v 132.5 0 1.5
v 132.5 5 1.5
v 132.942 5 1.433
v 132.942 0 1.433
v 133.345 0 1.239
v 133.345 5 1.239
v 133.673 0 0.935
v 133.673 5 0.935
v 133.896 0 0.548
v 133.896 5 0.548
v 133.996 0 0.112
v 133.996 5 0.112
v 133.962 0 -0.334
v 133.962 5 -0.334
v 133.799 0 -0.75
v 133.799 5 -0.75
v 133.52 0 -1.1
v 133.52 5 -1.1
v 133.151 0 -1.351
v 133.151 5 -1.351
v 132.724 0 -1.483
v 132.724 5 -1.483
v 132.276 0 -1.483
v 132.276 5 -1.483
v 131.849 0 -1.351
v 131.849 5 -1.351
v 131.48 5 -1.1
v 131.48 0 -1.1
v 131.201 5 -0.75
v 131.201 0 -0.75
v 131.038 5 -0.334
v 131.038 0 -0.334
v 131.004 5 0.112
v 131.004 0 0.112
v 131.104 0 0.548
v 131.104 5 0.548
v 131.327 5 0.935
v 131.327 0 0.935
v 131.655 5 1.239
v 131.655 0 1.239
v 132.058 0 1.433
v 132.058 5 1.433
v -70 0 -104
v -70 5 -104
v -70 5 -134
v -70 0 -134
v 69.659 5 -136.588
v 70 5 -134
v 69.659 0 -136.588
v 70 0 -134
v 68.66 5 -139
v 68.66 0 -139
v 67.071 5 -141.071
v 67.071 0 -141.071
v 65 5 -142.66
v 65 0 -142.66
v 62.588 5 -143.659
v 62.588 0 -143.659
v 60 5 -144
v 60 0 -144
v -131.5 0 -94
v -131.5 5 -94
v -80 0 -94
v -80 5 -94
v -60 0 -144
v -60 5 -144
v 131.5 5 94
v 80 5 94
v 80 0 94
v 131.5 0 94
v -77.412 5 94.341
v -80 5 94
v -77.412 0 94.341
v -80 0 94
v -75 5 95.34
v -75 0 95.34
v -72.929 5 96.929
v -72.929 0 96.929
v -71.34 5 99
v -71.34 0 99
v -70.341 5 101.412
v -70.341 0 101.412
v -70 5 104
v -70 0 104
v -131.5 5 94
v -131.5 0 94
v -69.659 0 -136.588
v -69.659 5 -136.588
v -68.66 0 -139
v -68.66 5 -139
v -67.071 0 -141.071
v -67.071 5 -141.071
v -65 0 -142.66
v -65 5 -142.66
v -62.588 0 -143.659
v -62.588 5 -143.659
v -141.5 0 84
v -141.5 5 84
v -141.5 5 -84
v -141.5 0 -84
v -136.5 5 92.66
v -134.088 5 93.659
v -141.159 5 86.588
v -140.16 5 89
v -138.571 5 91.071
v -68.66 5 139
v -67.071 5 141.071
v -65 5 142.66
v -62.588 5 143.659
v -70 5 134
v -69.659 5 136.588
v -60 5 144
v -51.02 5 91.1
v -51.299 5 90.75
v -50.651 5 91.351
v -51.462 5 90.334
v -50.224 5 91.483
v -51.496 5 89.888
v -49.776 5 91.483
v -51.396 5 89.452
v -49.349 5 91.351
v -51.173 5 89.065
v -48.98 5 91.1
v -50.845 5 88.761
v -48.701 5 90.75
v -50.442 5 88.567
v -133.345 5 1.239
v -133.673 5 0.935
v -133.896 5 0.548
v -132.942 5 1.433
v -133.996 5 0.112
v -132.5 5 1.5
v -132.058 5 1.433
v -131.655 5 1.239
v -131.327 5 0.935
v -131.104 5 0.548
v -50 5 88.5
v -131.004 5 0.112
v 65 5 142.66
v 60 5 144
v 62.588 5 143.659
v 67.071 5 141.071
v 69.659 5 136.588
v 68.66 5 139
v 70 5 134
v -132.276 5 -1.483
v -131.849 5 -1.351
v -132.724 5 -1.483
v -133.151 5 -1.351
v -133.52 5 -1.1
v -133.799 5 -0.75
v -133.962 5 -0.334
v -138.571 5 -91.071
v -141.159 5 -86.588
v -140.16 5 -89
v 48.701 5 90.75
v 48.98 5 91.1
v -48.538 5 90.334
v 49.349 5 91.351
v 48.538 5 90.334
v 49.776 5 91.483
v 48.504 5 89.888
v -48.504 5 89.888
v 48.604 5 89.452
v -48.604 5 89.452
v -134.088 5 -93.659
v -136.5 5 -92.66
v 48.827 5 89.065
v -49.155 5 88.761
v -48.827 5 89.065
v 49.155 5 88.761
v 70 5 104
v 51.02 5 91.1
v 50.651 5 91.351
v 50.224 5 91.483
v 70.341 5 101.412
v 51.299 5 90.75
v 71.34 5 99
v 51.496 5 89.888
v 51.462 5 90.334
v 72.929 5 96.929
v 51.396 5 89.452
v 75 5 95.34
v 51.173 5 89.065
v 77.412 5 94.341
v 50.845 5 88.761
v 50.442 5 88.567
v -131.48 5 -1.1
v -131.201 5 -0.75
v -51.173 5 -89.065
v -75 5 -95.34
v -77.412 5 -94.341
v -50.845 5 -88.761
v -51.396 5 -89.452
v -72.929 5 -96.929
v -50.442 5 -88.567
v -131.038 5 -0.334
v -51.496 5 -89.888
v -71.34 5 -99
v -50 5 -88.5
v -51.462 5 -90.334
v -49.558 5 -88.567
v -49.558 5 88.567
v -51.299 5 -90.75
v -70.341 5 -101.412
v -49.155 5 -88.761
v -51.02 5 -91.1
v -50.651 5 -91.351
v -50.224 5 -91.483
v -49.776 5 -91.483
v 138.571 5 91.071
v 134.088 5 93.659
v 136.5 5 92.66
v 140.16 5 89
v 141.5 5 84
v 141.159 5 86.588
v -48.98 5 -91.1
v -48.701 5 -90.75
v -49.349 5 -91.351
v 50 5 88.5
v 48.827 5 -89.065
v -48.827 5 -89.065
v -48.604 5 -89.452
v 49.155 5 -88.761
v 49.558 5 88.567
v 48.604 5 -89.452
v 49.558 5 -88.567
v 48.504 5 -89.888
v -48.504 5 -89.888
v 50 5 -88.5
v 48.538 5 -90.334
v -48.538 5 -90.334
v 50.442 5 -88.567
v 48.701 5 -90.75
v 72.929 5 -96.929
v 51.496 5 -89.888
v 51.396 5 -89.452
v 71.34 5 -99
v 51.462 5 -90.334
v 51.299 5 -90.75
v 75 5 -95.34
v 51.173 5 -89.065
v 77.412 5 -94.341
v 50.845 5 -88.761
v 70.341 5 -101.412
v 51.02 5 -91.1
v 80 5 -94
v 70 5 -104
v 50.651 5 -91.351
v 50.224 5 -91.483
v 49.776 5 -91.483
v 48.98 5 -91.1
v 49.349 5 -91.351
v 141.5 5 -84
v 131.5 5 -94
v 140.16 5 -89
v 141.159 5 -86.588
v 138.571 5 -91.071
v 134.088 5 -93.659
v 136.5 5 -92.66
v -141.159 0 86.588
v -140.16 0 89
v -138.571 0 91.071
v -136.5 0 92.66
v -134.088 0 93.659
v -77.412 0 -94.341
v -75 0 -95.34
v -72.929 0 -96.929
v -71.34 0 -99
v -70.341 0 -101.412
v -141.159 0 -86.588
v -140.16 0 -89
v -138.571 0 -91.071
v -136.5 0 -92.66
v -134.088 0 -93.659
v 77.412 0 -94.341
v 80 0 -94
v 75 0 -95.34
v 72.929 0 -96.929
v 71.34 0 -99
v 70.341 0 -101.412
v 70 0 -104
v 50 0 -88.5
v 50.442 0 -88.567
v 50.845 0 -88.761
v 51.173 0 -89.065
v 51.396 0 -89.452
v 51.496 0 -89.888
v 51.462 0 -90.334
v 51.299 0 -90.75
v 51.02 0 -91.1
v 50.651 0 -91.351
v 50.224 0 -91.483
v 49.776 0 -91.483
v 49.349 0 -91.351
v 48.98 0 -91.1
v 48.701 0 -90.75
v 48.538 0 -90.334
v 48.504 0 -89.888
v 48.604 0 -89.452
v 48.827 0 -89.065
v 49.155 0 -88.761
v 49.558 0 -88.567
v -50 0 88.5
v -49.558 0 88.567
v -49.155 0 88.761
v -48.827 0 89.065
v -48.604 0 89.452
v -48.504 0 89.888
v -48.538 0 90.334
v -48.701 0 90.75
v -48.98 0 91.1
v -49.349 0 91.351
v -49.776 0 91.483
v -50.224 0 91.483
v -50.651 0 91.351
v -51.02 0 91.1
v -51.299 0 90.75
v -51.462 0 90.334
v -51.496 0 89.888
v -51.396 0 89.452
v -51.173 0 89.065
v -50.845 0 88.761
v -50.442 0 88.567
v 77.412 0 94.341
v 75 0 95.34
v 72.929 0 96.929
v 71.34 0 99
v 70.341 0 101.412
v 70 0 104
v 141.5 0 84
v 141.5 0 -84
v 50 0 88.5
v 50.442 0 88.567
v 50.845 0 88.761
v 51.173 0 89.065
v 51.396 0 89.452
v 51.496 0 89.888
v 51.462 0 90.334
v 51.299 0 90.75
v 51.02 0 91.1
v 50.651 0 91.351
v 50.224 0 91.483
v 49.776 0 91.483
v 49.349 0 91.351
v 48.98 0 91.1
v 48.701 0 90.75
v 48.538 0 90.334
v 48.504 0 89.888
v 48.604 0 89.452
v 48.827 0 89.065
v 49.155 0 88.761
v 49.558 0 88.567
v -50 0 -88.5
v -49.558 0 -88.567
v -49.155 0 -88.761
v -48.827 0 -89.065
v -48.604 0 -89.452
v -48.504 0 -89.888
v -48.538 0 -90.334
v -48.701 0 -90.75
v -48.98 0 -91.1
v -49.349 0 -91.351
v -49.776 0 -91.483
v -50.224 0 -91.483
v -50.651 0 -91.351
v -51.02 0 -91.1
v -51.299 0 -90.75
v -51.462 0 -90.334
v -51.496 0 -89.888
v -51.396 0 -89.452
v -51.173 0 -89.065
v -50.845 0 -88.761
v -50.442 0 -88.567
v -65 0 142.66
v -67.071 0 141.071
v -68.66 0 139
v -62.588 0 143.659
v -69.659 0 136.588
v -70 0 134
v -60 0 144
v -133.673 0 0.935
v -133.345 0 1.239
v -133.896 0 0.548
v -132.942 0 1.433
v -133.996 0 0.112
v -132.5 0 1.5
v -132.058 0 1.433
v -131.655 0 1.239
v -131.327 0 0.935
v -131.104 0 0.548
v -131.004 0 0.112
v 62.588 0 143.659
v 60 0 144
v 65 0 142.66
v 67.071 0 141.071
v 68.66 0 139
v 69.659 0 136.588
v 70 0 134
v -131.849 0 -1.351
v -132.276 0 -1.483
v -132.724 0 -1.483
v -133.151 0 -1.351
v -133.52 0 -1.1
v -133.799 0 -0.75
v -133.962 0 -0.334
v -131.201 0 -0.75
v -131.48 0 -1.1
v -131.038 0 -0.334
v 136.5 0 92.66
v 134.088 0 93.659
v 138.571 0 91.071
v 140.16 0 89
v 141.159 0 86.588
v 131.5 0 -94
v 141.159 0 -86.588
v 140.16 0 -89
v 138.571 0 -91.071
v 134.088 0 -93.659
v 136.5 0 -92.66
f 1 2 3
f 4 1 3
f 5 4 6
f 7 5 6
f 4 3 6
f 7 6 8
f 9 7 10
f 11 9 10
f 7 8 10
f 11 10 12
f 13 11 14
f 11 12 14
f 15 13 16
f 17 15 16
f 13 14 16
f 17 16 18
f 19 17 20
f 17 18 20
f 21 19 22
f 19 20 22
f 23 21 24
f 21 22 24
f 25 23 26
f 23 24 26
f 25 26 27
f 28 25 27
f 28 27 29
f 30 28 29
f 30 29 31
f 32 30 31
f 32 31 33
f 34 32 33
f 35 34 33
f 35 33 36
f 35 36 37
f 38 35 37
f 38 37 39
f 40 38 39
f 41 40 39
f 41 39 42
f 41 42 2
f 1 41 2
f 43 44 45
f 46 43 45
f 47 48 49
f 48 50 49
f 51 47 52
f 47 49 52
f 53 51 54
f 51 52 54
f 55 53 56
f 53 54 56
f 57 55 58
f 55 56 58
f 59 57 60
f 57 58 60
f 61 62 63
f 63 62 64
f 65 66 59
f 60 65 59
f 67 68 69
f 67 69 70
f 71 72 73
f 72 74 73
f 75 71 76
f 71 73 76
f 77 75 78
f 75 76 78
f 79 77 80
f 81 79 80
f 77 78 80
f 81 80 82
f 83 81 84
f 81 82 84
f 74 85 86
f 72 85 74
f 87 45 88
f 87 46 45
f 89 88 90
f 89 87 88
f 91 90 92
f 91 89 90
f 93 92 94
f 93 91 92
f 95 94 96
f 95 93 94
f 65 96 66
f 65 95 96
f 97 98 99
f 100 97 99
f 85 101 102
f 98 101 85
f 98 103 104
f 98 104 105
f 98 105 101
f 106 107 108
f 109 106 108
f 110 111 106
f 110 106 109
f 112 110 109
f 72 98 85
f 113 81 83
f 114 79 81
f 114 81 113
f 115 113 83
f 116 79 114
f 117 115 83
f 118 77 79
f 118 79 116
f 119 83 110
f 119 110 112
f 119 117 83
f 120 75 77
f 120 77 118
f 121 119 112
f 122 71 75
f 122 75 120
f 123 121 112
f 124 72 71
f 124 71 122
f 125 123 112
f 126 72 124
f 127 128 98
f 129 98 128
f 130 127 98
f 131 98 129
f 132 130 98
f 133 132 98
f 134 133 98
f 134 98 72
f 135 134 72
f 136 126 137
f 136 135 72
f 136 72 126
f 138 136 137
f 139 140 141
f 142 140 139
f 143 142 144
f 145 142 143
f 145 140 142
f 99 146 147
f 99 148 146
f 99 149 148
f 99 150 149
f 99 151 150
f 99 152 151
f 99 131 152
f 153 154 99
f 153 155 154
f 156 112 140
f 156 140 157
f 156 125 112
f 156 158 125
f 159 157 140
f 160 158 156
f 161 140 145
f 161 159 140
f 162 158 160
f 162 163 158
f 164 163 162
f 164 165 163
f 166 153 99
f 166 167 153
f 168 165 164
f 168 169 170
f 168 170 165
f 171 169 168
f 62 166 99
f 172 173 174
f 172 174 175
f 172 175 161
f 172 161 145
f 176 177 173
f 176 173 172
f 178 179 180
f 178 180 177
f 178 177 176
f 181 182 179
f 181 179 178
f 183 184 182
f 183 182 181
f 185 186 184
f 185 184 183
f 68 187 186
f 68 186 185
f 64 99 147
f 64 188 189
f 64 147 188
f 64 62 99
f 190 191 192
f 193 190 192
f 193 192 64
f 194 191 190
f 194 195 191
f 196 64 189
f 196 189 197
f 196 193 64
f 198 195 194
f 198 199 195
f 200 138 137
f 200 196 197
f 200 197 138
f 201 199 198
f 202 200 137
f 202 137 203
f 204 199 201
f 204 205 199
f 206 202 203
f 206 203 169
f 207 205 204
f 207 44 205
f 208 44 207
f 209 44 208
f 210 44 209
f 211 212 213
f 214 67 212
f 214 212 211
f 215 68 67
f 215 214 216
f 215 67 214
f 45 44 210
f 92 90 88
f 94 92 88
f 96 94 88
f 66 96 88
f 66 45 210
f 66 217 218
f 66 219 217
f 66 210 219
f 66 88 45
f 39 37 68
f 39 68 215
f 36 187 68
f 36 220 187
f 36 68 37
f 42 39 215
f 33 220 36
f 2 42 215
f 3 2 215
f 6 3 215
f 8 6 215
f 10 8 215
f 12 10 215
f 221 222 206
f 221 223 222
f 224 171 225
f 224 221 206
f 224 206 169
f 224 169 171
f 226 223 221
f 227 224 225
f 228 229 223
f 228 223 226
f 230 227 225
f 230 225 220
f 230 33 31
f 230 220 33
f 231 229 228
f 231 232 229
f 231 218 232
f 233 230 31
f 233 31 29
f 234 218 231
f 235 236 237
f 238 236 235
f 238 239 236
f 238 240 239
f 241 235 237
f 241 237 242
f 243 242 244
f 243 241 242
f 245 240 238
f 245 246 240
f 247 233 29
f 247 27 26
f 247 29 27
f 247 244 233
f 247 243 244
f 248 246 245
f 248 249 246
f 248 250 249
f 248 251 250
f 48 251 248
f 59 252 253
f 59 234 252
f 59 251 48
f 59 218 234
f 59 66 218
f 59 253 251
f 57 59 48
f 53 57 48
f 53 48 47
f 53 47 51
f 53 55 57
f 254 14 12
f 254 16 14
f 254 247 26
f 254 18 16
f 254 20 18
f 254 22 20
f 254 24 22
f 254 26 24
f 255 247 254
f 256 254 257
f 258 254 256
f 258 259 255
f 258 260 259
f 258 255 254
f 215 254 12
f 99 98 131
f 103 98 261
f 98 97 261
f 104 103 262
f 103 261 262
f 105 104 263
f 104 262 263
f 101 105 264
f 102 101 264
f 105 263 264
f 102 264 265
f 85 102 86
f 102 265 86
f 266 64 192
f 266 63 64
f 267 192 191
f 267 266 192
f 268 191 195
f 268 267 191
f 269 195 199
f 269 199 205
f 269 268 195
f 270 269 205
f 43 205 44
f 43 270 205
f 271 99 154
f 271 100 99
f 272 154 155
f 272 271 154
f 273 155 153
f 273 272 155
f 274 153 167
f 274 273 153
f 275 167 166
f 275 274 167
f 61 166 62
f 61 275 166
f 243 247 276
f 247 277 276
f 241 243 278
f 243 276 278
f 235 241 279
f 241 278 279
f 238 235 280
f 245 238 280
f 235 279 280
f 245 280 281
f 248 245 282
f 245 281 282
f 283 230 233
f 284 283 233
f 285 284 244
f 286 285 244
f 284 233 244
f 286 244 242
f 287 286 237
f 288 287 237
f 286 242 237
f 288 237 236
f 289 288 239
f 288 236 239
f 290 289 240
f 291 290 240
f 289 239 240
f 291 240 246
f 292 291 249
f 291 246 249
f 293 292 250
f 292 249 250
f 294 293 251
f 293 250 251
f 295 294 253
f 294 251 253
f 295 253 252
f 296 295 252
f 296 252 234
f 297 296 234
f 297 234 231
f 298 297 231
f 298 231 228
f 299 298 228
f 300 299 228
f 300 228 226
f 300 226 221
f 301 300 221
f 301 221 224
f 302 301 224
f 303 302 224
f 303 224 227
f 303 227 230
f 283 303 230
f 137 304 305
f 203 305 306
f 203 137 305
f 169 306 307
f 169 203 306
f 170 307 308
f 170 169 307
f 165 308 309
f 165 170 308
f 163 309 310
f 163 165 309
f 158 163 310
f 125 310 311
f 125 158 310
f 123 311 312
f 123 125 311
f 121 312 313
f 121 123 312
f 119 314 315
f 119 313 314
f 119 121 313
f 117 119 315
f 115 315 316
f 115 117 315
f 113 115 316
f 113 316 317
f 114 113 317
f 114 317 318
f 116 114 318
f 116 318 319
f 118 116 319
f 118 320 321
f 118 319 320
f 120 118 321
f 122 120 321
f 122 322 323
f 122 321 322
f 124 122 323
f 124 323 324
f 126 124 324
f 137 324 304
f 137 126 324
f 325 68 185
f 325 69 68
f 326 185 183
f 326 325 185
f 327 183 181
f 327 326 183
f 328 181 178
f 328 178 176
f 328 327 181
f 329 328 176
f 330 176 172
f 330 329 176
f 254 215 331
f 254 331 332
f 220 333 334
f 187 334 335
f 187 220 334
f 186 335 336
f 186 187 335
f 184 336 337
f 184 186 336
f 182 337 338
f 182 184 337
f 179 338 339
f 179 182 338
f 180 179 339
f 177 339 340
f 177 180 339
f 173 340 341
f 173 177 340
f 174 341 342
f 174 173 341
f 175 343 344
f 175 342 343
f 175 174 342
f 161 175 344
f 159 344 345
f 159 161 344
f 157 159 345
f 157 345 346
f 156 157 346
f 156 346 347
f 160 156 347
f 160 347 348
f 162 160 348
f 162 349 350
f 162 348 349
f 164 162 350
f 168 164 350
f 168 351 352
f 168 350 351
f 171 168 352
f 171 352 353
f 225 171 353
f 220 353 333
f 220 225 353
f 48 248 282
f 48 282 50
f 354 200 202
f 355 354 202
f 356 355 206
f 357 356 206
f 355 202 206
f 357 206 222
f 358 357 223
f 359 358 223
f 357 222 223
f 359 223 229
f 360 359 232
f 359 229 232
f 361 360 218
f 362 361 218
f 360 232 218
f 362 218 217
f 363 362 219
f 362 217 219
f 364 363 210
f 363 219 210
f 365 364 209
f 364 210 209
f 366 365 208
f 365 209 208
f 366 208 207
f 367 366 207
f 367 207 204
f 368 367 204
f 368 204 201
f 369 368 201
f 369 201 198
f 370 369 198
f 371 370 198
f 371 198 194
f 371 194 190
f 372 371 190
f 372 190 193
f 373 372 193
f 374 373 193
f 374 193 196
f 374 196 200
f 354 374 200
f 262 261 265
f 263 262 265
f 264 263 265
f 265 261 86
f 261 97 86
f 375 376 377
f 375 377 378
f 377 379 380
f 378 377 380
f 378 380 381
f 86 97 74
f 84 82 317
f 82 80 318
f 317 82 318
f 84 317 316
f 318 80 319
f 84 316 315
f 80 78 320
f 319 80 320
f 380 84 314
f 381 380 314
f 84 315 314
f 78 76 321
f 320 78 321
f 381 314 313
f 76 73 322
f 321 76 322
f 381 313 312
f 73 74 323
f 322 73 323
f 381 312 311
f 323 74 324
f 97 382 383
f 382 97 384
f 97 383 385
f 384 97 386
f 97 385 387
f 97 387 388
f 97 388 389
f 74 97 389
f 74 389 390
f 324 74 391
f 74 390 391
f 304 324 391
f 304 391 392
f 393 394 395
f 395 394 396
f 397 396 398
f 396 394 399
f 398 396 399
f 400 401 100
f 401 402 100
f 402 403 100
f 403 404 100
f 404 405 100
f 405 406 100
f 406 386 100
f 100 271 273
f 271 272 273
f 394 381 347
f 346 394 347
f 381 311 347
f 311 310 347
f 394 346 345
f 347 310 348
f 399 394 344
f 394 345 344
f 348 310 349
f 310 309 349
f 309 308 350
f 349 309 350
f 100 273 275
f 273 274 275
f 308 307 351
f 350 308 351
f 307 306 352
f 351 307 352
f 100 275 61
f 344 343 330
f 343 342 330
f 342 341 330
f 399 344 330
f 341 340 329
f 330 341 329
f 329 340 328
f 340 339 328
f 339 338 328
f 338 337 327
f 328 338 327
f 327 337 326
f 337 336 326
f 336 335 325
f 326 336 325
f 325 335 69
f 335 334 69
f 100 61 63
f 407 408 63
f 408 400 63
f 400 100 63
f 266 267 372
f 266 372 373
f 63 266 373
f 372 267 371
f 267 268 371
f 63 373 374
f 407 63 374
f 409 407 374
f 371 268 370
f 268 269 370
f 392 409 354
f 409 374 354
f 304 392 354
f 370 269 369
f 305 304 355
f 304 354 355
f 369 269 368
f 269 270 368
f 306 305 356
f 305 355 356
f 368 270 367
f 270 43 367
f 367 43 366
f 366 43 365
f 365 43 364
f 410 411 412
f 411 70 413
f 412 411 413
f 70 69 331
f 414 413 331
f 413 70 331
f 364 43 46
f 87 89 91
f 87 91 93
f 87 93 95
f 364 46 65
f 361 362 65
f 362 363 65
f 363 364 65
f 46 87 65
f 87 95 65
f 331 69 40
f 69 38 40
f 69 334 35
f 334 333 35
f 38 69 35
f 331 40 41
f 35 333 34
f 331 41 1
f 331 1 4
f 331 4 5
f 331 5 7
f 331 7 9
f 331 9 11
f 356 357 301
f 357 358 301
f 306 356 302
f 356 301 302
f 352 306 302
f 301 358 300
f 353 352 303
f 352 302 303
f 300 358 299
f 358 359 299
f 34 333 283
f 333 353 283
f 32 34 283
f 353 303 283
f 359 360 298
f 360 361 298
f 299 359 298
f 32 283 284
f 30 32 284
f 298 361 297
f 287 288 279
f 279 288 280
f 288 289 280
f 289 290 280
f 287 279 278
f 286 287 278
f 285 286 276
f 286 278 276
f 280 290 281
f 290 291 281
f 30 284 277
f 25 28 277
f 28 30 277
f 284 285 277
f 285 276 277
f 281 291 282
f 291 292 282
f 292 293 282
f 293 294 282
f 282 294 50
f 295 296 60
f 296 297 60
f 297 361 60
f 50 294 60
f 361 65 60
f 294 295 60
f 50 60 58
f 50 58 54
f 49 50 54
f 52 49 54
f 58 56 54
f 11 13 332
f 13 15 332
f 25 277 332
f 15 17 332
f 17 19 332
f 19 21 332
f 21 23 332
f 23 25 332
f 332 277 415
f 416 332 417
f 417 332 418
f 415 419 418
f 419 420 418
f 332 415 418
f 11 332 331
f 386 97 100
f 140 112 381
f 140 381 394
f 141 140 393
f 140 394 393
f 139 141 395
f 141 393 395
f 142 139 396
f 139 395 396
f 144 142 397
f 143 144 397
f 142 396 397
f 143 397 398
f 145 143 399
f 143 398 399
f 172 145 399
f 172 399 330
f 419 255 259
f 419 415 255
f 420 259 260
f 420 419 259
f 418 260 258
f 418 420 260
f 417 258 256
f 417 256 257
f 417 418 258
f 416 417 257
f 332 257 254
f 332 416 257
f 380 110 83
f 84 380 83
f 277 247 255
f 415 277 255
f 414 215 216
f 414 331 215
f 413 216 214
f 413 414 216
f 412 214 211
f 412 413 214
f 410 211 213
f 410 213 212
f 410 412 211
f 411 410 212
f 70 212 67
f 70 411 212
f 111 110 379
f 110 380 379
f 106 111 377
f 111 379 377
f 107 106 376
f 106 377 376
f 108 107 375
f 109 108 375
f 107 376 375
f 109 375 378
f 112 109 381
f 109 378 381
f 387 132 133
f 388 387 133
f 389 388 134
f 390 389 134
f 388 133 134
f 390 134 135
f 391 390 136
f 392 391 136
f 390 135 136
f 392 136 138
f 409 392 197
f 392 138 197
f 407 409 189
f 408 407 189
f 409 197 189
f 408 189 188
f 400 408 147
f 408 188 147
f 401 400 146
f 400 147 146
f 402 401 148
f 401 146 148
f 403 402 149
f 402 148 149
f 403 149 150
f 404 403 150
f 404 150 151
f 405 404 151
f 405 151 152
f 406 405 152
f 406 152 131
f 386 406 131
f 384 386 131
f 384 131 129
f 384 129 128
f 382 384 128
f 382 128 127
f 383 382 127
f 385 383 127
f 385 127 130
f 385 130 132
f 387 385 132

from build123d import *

# Parameters (mm, degrees)
SKETCH_1_W           = 300
SKETCH_1_H           = 300
EXTRUDE_1_DEPTH      = 5
CUT_EXTRUDE_3_DEPTH  = 10
CUT_EXTRUDE_5_DEPTH  = 10
SKETCH_7_OUTSIDE_W   = 373.028
SKETCH_7_OUTSIDE_H   = 263.028
SKETCH_7_OUTSIDE_W_2 = 283
SKETCH_7_OUTSIDE_H_2 = 188
CUT_EXTRUDE_6_DEPTH  = 10
FILLET_1_R           = 10
SKETCH_8_R           = 1.5
CUT_EXTRUDE_7_DEPTH  = 200
SKETCH_9_R           = 1.5
CUT_EXTRUDE_8_DEPTH  = 200
SKETCH_10_W          = 140
SKETCH_10_H          = 50
EXTRUDE_2_DEPTH      = 5
FILLET_2_R           = 10


with BuildPart() as part:
    # 草图1 → 凸台-拉伸1 (new body)
    with BuildSketch(Plane(origin=(0, 0, 0), x_dir=(1, 0, 0), z_dir=(0, 1, 0))):
        Rectangle(SKETCH_1_W, SKETCH_1_H)
    extrude(amount=EXTRUDE_1_DEPTH)

    # 草图4 → 切除-拉伸3 (cut)
    with BuildSketch(Plane(origin=(0, 5, 0), x_dir=(1, 0, 0), z_dir=(0, 1, 0))):
        Polygon((-88.251311829, 95), (84.324863402, 95), (73.252498177, 170.696662895), (-48.543519298, 170.696662895), align=None)
        Polygon((-81.835862219, -95), (-68.397415564, -170.764406983), (34.942066678, -175.273207327), (78.78868079, -129.283443823), (78.78868079, -95), align=None)
    extrude(amount=-CUT_EXTRUDE_3_DEPTH, mode=Mode.SUBTRACT)

    # 草图6 → 切除-拉伸5 (cut)
    with BuildSketch(Plane(origin=(0, 5, 0), x_dir=(1, 0, 0), z_dir=(0, 1, 0))):
        Polygon((-88.251311829, 95), (233.509150227, 95), (223.865704495, 204.923221807), (-177.714928491, 215.944302643), (-226.620974704, 137.419101682), (-226.620974704, 114.688122456), (-226.620974704, 95), align=None)
        Polygon((-81.835862219, -95), (223.865704495, -95), (223.865704495, -205.612039359), (-238.330873093, -205.612039359), (-238.330873093, -95), align=None)
    extrude(amount=-CUT_EXTRUDE_5_DEPTH, mode=Mode.SUBTRACT)

    # 草图7 outside → 切除-拉伸6 (cut)
    with BuildSketch(Plane(origin=(0, 5, 0), x_dir=(1, 0, 0), z_dir=(0, 1, 0))):
        Rectangle(SKETCH_7_OUTSIDE_W, SKETCH_7_OUTSIDE_H)
        Rectangle(SKETCH_7_OUTSIDE_W_2, SKETCH_7_OUTSIDE_H_2, mode=Mode.SUBTRACT)
    extrude(amount=-CUT_EXTRUDE_6_DEPTH, mode=Mode.SUBTRACT)

    # 圆角1
    fillet_1_edges = [part.edges().sort_by_distance(p)[0] for p in [
        (-141.5, 2.5, -94),
        (141.5, 2.5, -94),
        (141.5, 2.5, 94),
        (-141.5, 2.5, 94),
    ]]
    fillet(fillet_1_edges, radius=FILLET_1_R)

    # 草图8 → 切除-拉伸7 (cut)
    with BuildSketch(Plane(origin=(0, 5, 0), x_dir=(1, 0, 0), z_dir=(0, 1, 0))):
        with Locations(Location((-132.5, 0, 0), (0, 0, 270))):
            Circle(SKETCH_8_R)
        with Locations(Location((132.5, 0, 0), (0, 0, 270))):
            Circle(SKETCH_8_R)
    extrude(amount=-CUT_EXTRUDE_7_DEPTH, mode=Mode.SUBTRACT)

    # 草图9 → 切除-拉伸8 (cut)
    with BuildSketch(Plane(origin=(0, 5, 0), x_dir=(1, 0, 0), z_dir=(0, 1, 0))):
        with Locations(Location((-50, 90, 0), (0, 0, 270))):
            Circle(SKETCH_9_R)
        with Locations(Location((50, 90, 0), (0, 0, 270))):
            Circle(SKETCH_9_R)
    cut_extrude_8 = extrude(amount=-CUT_EXTRUDE_8_DEPTH, mode=Mode.SUBTRACT)

    # 镜向1: 切除-拉伸8 across plane
    add(cut_extrude_8.mirror(Plane.XY), mode=Mode.SUBTRACT)

    # 草图10 → 凸台-拉伸2 (add)
    with BuildSketch(Plane(origin=(0, 5, 0), x_dir=(1, 0, 0), z_dir=(0, 1, 0))):
        with Locations((0, -119)):
            Rectangle(SKETCH_10_W, SKETCH_10_H)
        with Locations((0, 119)):
            Rectangle(SKETCH_10_W, SKETCH_10_H)
    extrude(amount=-EXTRUDE_2_DEPTH)

    # 圆角2
    fillet_2_edges = [part.edges().sort_by_distance(p)[0] for p in [
        (-70, 2.5, 144),
        (-70, 2.5, 94),
        (70, 2.5, 94),
        (70, 2.5, 144),
        (70, 2.5, -94),
        (-70, 2.5, -94),
        (-70, 2.5, -144),
        (70, 2.5, -144),
    ]]
    fillet(fillet_2_edges, radius=FILLET_2_R)


solid = part.part
